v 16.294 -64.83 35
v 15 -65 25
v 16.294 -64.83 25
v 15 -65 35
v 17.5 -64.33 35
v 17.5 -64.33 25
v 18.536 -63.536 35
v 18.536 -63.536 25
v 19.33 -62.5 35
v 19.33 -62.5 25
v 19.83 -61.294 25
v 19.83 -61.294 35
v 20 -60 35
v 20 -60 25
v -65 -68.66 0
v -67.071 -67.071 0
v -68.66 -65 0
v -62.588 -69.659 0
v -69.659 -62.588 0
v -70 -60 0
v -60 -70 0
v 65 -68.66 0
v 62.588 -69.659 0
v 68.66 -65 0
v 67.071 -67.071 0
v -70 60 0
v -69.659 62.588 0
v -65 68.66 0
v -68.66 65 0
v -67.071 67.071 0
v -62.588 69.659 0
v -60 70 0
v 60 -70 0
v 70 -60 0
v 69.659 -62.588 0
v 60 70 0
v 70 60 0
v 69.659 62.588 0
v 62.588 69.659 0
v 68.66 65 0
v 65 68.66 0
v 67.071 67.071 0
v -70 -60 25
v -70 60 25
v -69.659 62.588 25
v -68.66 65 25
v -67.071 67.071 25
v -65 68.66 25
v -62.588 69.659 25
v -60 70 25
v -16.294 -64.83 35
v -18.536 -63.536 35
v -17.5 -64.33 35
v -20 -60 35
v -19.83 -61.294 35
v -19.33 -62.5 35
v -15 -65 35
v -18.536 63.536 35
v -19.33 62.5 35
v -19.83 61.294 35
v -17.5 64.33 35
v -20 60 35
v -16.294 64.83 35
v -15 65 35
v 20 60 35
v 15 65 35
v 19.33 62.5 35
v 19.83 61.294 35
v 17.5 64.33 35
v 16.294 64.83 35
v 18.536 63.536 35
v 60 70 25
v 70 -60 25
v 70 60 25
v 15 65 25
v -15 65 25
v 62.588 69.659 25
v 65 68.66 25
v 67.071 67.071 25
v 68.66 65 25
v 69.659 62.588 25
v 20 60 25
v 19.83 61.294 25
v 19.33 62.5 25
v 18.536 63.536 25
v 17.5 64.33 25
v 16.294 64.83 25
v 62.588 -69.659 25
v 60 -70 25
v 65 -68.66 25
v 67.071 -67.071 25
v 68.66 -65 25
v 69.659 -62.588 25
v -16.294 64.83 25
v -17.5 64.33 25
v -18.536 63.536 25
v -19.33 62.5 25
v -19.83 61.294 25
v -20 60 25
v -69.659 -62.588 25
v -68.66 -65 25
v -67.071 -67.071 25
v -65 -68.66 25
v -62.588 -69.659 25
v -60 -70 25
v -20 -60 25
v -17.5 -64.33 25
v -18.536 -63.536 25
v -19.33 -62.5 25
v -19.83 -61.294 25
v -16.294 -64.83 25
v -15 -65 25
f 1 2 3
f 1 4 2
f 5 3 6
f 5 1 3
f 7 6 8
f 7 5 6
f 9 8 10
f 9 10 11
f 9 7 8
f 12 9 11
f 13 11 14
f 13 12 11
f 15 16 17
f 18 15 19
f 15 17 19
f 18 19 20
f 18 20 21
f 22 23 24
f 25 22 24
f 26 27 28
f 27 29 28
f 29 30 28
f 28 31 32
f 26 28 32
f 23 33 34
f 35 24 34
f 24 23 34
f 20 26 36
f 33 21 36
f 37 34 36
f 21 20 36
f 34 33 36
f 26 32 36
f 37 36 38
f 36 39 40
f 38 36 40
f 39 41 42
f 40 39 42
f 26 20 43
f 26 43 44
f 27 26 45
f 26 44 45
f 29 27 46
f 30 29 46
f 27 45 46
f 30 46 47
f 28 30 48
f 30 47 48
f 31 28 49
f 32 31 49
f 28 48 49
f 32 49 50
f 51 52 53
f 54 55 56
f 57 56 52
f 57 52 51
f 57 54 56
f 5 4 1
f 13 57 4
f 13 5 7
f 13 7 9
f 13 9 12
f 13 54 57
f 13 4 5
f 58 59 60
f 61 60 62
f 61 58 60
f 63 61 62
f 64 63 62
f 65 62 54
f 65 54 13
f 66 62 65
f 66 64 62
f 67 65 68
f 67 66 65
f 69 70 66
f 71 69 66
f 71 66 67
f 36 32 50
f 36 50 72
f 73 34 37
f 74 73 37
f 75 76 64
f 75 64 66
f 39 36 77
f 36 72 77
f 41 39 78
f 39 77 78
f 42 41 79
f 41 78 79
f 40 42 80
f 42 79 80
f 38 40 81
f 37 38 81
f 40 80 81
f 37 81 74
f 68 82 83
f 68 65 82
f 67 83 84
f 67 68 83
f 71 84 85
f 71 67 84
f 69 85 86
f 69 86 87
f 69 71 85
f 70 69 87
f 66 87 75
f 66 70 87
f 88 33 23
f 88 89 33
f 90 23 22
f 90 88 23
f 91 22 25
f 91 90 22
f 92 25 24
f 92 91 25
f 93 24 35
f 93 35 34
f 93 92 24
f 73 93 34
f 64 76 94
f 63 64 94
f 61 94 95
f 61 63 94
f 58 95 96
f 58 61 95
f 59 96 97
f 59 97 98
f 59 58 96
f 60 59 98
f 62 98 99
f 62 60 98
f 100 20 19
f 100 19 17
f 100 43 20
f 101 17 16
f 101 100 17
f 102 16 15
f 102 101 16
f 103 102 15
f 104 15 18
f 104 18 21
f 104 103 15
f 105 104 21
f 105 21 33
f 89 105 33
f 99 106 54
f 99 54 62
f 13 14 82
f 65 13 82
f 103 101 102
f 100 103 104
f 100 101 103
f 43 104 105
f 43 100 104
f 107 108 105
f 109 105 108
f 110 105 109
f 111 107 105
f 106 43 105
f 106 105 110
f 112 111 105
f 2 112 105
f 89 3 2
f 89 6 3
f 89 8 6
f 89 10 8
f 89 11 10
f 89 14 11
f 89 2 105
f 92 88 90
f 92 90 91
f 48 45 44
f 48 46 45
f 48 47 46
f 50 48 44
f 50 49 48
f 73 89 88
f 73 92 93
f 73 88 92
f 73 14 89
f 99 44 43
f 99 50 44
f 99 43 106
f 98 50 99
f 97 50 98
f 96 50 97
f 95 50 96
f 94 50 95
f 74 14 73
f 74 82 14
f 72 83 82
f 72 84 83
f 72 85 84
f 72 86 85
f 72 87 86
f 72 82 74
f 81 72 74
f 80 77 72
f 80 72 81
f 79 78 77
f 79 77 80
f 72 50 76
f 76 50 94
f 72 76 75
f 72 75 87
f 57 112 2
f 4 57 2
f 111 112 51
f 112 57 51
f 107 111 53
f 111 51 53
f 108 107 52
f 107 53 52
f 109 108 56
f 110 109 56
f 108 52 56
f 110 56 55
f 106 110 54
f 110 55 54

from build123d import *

# Parameters (mm, degrees)
F0_W     = 140
F0_H     = 140
F0_W_2   = 40
F0_H_2   = 130
F1_DEPTH = 25
F2_DEPTH = 35
F3_R     = 10
F4_R     = 5


with BuildPart() as f1:
    # F0 (on Top) → F1 (new body)
    with BuildSketch(Plane.XY):
        Rectangle(F0_W, F0_H)
        Rectangle(F0_W_2, F0_H_2, mode=Mode.SUBTRACT)
    extrude(amount=F1_DEPTH)

    # F0 (on Top) → F2 (join)
    with BuildSketch(Plane.XY):
        Rectangle(F0_W_2, F0_H_2)
    extrude(amount=F2_DEPTH)

    # F3
    f3_edges = [f1.edges().sort_by_distance(p)[0] for p in [
        (-70, 70, 12.5),
        (70, 70, 12.5),
        (70, -70, 12.5),
        (-70, -70, 12.5),
    ]]
    fillet(f3_edges, radius=F3_R)

    # F4
    f4_edges = [f1.edges().sort_by_distance(p)[0] for p in [
        (-20, -65, 30),
        (20, -65, 30),
        (20, 65, 30),
        (-20, 65, 30),
    ]]
    fillet(f4_edges, radius=F4_R)


solid = f1.part
